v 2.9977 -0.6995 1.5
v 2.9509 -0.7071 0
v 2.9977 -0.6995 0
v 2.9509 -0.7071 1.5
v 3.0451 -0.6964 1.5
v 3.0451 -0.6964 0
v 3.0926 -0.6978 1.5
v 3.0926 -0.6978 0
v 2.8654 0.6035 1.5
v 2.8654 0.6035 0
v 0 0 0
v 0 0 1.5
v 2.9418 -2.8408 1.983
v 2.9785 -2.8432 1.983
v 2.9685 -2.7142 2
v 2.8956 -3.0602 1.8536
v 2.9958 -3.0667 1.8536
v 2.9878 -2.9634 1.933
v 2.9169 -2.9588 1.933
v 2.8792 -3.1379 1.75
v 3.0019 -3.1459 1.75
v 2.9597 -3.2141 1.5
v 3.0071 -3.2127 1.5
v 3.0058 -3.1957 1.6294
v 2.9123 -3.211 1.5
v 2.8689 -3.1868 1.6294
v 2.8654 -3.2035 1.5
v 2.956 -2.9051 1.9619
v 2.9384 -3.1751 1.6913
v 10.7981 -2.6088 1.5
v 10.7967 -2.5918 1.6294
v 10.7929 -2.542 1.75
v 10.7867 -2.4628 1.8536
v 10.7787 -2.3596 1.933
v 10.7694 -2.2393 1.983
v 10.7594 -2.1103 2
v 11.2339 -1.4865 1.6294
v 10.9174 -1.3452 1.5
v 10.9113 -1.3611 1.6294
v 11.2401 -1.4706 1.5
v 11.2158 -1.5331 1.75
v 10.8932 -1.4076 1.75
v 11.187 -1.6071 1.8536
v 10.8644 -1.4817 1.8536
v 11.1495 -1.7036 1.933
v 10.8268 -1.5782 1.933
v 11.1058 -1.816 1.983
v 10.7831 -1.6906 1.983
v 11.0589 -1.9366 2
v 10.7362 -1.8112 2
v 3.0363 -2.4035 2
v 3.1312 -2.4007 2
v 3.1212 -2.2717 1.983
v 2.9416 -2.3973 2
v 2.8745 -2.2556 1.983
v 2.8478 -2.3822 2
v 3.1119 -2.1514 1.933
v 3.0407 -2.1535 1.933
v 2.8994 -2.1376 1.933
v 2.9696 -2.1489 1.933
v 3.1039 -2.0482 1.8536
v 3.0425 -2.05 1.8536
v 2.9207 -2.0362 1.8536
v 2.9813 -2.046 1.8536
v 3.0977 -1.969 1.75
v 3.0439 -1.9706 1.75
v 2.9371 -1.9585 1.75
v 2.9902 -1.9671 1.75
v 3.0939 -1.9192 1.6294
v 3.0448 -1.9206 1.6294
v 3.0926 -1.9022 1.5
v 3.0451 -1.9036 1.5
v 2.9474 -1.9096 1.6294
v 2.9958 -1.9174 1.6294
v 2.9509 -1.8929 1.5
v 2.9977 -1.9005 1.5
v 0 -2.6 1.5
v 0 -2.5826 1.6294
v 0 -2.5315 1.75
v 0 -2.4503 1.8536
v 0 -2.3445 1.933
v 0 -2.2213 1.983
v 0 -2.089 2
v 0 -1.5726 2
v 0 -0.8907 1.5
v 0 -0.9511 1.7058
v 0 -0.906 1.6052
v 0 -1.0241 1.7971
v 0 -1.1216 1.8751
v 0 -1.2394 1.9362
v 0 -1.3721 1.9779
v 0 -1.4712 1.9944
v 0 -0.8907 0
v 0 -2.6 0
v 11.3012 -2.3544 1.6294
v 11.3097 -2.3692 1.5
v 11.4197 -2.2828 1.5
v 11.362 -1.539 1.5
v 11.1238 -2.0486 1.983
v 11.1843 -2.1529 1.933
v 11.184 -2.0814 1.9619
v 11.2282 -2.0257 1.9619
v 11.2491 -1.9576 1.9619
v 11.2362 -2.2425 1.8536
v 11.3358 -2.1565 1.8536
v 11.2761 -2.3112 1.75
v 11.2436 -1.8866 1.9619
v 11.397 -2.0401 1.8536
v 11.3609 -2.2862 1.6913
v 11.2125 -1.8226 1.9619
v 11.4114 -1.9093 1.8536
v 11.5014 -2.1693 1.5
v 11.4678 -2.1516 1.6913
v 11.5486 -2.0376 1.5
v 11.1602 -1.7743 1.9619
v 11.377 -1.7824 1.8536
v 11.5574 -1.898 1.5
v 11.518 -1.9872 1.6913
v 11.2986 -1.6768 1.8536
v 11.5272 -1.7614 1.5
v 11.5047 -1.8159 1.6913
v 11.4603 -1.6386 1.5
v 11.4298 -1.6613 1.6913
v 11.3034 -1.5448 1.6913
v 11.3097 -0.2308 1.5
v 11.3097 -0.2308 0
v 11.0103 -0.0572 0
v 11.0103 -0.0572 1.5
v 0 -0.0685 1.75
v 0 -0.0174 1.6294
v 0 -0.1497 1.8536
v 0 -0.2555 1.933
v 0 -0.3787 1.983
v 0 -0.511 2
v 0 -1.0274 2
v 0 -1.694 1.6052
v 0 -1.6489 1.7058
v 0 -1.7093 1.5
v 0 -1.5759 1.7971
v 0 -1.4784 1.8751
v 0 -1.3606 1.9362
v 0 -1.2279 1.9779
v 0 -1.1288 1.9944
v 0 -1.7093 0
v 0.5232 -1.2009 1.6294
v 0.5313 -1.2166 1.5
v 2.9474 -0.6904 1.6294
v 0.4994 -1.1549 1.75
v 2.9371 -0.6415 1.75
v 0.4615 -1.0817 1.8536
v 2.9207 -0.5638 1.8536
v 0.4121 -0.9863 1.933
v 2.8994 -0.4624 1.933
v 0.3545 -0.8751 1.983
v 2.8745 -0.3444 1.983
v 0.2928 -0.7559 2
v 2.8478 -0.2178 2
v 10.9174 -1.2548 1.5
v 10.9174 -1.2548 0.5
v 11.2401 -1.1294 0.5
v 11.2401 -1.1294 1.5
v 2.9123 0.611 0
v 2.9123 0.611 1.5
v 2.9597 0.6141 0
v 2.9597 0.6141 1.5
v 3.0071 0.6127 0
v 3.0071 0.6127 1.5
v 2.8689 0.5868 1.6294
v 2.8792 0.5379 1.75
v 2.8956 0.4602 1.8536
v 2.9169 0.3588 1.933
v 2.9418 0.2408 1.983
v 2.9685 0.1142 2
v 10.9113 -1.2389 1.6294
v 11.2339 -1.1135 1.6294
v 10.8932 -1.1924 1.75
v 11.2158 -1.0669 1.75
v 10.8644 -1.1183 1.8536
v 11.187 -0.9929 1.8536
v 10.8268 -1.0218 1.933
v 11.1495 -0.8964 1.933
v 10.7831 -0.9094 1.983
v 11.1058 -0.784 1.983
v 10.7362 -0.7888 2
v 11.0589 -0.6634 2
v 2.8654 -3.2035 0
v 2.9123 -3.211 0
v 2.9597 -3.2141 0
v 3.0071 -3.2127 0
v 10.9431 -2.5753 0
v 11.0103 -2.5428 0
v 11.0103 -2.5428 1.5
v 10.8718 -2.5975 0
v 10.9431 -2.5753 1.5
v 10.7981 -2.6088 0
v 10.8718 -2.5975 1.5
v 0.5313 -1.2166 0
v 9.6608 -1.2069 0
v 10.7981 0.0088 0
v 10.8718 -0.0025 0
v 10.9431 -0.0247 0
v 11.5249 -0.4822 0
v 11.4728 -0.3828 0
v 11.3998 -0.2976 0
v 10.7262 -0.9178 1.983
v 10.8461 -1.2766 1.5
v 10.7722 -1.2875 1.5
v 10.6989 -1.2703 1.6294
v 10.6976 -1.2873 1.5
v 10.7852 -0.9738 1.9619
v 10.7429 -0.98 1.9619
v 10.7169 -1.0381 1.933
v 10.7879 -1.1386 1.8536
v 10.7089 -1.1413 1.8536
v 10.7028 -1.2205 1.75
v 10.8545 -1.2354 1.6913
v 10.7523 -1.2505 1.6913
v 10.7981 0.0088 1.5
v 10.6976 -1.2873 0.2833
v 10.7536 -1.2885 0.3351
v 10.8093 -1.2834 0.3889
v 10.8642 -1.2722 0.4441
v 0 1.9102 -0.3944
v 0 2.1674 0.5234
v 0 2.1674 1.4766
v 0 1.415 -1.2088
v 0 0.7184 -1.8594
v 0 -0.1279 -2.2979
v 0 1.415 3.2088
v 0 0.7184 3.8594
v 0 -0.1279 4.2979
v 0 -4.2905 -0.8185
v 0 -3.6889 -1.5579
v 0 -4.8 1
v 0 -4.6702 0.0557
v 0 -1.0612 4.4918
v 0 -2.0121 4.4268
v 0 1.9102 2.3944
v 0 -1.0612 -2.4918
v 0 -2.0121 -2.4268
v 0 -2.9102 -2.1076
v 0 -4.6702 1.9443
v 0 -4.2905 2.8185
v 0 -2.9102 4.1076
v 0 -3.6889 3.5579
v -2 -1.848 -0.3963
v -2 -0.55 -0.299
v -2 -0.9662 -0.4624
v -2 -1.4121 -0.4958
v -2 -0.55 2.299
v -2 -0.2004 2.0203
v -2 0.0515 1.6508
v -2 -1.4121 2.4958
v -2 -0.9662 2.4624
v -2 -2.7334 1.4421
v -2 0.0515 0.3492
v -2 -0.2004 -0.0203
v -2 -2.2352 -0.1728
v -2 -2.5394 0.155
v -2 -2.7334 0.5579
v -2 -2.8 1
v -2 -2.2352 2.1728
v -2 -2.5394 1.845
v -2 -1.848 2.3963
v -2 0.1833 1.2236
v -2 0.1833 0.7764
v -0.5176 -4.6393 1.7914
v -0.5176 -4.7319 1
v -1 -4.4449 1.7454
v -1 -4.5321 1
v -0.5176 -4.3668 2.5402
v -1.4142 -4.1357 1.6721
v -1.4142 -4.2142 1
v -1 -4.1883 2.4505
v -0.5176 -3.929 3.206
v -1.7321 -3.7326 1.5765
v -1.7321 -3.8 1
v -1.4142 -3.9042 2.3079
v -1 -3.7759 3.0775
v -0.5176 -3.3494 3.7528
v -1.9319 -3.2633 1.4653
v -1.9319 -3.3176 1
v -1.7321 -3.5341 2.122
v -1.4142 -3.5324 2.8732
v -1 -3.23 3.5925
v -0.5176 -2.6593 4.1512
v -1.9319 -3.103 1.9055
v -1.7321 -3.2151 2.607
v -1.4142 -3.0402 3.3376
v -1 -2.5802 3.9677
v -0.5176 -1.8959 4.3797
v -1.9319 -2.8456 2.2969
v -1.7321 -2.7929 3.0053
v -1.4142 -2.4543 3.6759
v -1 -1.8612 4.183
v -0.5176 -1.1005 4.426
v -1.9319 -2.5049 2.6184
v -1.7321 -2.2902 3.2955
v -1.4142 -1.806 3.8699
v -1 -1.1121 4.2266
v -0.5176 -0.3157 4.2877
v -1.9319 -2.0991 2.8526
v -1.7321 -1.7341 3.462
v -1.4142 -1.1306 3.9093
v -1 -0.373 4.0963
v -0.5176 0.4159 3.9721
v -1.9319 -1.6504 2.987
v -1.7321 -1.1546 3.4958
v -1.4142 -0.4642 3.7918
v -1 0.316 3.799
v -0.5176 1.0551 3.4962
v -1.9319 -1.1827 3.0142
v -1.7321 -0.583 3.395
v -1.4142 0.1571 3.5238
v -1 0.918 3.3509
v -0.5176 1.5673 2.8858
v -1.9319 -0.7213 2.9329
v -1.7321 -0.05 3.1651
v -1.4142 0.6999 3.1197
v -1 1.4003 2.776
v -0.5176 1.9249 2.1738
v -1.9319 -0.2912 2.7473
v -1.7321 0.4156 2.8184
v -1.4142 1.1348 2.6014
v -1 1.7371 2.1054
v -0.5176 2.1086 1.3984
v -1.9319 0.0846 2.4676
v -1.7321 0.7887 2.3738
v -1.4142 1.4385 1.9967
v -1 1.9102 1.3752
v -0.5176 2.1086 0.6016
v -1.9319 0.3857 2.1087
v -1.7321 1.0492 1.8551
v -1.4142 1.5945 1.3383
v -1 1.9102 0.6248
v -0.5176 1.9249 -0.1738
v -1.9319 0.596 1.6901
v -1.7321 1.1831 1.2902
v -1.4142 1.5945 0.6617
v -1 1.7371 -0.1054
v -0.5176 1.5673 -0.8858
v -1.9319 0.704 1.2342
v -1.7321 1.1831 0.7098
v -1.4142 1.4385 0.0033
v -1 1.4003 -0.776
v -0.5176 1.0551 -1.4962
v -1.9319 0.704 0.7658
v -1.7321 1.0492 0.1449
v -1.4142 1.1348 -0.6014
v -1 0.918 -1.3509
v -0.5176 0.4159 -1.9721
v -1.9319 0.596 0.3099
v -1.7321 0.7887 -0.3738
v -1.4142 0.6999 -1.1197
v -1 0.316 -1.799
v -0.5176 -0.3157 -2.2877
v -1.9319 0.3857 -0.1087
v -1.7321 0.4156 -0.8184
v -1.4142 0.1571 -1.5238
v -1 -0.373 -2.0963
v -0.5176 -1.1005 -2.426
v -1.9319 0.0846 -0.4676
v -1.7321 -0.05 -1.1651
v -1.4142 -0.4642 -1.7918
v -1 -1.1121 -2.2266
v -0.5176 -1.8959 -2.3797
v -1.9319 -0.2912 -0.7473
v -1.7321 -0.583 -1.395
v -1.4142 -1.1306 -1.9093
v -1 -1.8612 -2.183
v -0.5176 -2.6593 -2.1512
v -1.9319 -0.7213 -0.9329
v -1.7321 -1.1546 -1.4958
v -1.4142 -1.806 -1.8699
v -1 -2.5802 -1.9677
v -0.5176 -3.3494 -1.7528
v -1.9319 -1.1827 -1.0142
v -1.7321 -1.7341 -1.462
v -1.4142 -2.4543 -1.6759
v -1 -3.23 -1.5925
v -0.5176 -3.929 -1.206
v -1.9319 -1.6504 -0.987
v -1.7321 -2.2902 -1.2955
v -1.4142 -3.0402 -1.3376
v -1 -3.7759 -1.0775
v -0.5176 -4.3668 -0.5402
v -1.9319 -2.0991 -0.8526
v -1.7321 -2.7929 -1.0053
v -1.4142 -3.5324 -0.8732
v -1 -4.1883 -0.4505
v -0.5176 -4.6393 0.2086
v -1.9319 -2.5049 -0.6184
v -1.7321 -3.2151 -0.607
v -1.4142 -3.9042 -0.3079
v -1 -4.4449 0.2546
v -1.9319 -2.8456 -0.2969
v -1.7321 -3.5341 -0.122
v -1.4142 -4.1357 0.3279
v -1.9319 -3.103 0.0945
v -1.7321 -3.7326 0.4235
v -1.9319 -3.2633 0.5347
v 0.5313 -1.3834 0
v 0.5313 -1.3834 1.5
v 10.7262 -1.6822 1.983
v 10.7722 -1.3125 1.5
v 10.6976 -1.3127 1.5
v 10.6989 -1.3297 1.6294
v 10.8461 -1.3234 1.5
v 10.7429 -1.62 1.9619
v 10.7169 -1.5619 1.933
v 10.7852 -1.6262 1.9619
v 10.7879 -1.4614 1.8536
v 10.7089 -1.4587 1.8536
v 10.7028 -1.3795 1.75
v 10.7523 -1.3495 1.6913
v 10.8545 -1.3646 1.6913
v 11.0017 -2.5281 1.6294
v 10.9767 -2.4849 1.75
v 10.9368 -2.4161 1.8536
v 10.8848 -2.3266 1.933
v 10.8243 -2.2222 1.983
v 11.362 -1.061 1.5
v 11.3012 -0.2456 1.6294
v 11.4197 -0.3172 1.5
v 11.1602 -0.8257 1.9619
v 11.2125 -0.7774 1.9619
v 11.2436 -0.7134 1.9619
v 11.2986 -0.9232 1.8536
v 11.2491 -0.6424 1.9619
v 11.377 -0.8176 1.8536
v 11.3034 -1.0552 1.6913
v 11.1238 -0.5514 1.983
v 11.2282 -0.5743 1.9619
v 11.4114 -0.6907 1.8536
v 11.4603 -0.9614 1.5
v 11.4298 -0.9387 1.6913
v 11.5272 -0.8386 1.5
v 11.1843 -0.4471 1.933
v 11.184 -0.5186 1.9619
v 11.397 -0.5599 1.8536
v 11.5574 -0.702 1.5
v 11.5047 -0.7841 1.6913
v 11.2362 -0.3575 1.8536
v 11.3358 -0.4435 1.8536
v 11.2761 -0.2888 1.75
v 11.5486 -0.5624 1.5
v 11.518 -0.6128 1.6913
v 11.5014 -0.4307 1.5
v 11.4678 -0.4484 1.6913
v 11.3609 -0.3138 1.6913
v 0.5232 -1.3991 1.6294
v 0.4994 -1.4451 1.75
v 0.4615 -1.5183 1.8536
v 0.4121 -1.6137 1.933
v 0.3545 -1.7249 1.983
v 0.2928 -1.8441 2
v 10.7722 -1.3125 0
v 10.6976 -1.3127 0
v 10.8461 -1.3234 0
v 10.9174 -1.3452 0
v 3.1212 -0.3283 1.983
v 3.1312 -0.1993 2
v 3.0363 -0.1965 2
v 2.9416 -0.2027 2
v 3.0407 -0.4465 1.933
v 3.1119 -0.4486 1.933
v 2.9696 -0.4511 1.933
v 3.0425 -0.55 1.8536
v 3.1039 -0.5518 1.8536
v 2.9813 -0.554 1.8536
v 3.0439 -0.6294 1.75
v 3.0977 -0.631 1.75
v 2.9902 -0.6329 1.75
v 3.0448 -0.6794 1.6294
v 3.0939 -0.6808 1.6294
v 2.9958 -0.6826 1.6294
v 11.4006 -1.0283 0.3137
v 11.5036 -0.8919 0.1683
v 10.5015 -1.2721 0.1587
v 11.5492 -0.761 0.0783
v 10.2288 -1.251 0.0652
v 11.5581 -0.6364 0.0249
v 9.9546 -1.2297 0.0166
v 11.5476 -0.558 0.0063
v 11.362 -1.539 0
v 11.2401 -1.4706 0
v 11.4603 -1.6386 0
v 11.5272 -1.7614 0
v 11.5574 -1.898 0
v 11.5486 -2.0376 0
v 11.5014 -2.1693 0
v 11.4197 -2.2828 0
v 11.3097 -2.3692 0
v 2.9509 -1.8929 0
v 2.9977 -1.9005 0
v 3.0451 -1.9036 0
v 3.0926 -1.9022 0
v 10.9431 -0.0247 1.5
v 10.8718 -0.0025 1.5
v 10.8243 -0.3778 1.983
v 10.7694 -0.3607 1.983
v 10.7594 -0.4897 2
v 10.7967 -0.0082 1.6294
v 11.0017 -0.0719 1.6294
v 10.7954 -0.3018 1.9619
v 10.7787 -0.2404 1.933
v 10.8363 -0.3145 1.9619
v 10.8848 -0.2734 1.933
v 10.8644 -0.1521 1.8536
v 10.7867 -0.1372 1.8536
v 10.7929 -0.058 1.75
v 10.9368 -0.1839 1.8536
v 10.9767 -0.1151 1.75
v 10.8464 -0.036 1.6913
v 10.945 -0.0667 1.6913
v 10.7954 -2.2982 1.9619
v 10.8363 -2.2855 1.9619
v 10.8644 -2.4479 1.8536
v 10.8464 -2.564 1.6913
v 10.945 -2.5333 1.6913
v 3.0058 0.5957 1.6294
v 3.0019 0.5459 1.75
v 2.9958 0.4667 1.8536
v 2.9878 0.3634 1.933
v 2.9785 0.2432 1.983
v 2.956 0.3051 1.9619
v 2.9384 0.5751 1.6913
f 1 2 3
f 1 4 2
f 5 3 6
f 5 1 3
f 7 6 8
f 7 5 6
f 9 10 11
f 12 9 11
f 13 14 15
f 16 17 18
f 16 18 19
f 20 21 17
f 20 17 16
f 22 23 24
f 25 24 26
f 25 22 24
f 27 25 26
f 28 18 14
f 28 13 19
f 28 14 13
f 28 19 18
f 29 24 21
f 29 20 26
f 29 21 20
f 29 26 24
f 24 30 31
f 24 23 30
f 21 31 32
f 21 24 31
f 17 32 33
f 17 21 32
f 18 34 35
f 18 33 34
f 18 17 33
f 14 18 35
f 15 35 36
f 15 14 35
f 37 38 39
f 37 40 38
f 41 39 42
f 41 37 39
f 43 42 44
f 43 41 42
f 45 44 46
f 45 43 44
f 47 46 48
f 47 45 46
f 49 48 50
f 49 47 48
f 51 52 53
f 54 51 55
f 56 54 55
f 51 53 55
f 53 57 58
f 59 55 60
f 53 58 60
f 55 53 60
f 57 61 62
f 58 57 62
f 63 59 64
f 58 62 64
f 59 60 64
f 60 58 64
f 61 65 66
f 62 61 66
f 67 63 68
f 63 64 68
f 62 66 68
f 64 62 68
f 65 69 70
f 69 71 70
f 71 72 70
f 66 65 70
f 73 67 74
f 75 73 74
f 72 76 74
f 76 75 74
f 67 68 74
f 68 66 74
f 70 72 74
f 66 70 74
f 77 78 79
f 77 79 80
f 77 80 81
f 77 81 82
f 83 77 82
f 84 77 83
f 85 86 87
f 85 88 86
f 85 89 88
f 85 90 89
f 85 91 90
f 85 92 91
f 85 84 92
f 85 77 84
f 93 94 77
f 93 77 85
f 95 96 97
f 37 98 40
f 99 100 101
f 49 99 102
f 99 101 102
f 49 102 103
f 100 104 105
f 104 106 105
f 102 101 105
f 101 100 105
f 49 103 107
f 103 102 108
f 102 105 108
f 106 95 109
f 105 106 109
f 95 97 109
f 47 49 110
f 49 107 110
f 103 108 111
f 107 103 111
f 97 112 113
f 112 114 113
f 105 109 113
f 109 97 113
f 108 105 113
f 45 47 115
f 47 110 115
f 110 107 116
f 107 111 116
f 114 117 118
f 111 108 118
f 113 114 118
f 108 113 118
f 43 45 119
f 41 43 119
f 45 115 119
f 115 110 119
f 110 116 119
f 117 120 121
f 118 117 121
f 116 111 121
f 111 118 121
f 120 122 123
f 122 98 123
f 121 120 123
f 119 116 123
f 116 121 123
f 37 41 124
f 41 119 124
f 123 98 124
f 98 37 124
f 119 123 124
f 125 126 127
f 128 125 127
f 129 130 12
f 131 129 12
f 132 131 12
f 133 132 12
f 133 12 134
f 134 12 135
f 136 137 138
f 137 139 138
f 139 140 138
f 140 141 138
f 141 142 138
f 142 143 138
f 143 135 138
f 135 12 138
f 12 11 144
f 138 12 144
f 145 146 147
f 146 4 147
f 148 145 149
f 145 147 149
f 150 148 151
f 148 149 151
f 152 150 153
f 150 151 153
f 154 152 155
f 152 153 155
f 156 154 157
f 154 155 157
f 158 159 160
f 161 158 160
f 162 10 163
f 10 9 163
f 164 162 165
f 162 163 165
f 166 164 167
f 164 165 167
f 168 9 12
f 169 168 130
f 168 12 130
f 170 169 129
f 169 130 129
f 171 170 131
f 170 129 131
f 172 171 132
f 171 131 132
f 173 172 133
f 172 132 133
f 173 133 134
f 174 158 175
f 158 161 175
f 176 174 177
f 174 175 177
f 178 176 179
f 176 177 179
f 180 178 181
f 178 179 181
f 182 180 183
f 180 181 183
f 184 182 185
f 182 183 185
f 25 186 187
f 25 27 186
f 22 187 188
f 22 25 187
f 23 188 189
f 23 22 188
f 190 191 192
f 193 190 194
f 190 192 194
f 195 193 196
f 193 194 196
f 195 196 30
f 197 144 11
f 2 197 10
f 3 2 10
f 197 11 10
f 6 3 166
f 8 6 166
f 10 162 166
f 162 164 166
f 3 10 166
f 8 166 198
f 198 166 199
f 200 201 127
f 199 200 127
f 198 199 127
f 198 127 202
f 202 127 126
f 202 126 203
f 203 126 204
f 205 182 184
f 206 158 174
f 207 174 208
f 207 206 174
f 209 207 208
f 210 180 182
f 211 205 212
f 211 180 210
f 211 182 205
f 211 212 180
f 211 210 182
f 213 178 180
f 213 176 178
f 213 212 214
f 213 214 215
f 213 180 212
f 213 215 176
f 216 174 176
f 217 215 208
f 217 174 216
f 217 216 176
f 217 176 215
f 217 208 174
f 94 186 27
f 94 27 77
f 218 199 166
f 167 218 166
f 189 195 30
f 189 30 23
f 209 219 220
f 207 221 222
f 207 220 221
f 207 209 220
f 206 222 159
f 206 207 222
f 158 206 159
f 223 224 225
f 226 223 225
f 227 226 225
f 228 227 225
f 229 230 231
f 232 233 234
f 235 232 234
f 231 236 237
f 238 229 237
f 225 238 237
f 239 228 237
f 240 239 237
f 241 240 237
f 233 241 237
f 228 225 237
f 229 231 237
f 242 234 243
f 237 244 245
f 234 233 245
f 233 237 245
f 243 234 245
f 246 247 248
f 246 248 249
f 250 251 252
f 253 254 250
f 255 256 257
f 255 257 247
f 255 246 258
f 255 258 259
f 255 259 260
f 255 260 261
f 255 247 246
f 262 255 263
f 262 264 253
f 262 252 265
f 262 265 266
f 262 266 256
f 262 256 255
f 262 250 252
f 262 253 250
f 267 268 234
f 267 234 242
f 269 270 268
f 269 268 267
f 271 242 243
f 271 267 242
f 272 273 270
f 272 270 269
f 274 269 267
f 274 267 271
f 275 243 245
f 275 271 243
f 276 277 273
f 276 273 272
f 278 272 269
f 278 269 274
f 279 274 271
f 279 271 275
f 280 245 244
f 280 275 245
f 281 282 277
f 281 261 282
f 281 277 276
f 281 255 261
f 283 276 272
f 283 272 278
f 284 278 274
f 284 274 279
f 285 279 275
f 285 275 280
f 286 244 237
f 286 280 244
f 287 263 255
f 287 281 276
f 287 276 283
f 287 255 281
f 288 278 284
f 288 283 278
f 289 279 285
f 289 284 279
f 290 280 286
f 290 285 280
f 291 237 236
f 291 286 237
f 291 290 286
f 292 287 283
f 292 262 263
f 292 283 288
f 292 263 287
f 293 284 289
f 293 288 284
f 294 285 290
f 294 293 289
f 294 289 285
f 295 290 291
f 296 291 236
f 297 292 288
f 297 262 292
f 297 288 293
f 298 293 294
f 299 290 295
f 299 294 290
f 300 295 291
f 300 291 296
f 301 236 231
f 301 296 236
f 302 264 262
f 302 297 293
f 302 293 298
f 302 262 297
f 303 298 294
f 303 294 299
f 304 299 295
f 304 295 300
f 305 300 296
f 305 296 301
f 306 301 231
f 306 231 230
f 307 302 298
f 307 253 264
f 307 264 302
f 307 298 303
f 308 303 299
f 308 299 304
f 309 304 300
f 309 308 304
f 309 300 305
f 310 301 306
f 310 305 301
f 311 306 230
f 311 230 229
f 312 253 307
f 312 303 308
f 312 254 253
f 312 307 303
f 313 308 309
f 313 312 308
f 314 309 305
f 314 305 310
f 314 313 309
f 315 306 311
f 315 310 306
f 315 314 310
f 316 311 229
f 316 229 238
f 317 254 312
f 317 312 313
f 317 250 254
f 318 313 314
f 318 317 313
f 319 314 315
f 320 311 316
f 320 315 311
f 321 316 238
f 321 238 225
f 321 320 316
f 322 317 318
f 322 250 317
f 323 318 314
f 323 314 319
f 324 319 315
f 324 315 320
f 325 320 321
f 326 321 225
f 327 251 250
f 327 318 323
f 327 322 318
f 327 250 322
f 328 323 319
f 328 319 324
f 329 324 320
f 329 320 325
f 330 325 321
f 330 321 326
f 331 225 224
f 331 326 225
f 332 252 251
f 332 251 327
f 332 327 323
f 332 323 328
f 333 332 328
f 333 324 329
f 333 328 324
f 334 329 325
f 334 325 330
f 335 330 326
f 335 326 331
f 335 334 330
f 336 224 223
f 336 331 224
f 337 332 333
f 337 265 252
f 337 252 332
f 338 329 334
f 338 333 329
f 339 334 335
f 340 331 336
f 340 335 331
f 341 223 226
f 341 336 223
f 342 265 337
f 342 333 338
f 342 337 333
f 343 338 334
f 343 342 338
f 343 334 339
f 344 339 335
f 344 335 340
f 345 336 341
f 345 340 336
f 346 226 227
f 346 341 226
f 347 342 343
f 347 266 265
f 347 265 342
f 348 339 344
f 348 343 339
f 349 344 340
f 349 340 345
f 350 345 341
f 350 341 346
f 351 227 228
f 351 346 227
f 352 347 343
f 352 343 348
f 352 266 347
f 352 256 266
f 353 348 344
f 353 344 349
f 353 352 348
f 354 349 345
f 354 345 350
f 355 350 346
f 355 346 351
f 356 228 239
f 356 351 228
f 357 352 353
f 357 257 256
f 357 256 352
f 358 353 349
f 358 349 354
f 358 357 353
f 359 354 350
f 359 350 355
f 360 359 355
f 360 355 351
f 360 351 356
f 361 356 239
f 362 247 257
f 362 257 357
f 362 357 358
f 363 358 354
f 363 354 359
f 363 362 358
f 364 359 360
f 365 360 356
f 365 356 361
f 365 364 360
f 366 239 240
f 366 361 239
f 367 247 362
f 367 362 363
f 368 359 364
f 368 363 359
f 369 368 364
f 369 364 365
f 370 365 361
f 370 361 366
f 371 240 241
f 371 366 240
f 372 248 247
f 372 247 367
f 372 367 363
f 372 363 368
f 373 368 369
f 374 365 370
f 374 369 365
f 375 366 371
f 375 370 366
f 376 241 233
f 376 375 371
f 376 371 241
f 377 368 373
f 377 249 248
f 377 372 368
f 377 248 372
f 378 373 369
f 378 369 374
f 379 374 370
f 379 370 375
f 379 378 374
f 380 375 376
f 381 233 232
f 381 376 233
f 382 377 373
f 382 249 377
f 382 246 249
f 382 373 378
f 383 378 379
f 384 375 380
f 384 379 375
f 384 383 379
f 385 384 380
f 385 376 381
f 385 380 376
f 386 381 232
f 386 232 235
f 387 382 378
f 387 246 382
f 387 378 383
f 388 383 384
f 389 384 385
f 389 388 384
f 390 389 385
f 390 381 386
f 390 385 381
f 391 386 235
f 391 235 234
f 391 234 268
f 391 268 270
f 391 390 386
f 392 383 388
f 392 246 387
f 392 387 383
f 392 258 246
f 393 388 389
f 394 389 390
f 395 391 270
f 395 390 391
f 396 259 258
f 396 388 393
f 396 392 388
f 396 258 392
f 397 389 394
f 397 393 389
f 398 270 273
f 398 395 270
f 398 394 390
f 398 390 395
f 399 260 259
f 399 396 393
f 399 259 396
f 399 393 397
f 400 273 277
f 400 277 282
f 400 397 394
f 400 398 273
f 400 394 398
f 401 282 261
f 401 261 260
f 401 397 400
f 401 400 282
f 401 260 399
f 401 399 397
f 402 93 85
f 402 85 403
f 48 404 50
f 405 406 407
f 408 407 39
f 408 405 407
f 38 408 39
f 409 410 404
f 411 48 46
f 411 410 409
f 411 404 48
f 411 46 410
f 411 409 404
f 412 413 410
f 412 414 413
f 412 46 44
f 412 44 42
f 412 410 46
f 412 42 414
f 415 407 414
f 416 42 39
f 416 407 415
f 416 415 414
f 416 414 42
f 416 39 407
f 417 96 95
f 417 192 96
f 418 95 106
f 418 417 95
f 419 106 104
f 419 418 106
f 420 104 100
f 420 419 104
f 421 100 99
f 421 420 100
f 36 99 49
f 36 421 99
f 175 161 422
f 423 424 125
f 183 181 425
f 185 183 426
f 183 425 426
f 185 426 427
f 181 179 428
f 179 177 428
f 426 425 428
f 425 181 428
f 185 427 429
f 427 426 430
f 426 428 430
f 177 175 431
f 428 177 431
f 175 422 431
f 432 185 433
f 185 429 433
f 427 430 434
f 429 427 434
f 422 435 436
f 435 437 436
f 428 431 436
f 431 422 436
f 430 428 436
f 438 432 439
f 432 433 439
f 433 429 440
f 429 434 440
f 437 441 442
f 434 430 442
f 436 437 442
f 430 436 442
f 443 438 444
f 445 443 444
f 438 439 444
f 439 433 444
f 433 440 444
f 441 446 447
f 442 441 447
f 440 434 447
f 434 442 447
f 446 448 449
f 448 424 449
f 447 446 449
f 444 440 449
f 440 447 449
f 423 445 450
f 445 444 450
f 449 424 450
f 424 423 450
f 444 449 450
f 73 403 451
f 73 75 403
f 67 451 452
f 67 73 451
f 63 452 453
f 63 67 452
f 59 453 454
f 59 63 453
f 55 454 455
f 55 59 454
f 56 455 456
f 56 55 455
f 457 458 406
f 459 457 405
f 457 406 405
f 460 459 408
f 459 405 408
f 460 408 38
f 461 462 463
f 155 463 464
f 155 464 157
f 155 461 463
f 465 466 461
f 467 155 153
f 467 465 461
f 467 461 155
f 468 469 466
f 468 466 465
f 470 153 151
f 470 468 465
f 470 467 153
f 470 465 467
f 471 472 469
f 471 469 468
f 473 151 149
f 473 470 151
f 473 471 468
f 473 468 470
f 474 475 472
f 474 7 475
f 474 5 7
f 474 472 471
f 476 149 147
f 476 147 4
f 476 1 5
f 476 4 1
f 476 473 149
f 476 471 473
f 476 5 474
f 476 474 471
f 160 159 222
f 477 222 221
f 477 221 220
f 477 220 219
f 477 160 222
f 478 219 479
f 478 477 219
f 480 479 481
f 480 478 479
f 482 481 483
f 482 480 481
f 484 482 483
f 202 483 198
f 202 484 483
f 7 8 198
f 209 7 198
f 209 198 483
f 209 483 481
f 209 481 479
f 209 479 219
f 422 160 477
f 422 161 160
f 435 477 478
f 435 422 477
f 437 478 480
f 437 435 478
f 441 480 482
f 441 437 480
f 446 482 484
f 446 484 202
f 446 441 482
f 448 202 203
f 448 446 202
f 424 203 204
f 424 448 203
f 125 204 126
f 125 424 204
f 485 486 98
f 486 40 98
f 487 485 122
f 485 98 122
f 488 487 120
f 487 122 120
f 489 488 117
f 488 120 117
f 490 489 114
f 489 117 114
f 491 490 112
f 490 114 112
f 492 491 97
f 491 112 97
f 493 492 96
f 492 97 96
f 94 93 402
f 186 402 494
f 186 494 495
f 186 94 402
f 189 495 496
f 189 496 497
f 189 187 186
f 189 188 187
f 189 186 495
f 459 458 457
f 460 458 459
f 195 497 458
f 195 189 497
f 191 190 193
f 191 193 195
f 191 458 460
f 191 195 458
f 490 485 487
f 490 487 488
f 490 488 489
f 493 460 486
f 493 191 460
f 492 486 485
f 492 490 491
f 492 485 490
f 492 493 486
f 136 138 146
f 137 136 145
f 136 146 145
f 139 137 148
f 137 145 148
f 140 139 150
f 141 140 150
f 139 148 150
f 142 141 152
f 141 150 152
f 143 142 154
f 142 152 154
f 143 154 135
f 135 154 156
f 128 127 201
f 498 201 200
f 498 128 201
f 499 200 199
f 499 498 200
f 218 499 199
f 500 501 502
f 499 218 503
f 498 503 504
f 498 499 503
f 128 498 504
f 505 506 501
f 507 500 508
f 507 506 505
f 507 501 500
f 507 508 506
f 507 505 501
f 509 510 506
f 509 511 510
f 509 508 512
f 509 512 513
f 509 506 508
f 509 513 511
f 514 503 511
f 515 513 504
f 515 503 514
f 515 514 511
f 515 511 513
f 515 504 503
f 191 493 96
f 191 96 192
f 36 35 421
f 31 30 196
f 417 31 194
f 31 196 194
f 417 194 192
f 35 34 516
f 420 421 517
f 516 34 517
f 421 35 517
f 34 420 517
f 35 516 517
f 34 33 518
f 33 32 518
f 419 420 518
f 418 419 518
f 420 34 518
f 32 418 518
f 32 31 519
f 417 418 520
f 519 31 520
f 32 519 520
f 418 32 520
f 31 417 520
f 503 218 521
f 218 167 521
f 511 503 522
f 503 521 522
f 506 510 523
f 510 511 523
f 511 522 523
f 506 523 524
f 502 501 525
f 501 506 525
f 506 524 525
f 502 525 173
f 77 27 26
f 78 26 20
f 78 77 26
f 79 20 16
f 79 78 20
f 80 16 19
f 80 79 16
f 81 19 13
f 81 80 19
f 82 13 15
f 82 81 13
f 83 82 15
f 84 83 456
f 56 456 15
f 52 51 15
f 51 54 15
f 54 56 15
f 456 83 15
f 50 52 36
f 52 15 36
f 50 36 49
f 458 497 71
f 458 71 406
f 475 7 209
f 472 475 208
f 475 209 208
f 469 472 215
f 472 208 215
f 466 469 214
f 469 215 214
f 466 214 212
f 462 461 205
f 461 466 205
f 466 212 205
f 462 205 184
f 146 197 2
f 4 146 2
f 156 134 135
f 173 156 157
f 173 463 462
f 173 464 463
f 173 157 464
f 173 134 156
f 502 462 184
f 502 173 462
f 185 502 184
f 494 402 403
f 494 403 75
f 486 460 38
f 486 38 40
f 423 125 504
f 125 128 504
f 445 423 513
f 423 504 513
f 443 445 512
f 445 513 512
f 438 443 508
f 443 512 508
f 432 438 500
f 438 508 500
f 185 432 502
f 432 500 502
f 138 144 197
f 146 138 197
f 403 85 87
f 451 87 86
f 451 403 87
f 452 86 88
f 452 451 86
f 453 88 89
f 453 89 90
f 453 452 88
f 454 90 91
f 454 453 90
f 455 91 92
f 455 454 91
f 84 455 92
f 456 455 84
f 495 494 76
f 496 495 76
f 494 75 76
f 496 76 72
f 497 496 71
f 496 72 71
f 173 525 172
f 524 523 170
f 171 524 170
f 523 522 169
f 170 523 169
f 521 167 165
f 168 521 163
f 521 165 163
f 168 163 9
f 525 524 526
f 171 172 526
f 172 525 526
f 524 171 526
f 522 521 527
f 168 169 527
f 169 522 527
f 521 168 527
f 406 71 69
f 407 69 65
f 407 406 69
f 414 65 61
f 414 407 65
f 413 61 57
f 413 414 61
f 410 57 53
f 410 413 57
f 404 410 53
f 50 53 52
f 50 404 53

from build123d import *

# Parameters (mm, degrees)
F1_DEPTH = 2
F4_R     = 0.5
F4_2_R   = 0.5
F5_R     = 3.5
F6_DEPTH = 2
F7_R     = 1.99999


# Not quite as in the source:
# - a fillet or chamfer is up to 0.001 mm smaller than in the source, because OpenCascade refuses the exact size


with BuildPart() as f1:
    # F0 (on Top) → F1 (new body)
    with BuildSketch(Plane.XY):
        Polygon((2.93560655, 0.6182347319), (0, 0), (0, -1.7093243077), (0.5313075392, -1.2166232651), (3.0210481864, -0.6922872837), (10.8112192467, -1.2961123241), (12.209258666, -0.7525262849), (10.9116823906, 0), align=None)
    extrude(amount=F1_DEPTH)


with BuildPart() as f3_1:
    # F3: instance of F1
    add(f1.part.mirror(Plane.XZ.offset(1.3)))

    # F4#2
    f4_2_edges = [f3_1.edges().sort_by_distance(p)[0] for p in [
        (3.021048, -1.907713, 1),
        (10.811219, -1.303888, 1),
        (12.209259, -1.847474, 1),
        (10.911682, -2.6, 1),
        (6.923644, -2.909117, 2),
        (11.560471, -2.223737, 2),
        (6.916134, -1.6058, 2),
        (11.510239, -1.575681, 2),
        (1.467803, -2.909117, 2),
        (2.935607, -3.218235, 1),
        (1.776178, -1.645545, 2),
        (0.265654, -1.137026, 2),
    ]]
    fillet(f4_2_edges, radius=F4_2_R)


with BuildPart() as f1_1:
    add(f1.part)

    # F4
    f4_edges = [f1_1.edges().sort_by_distance(p)[0] for p in [
        (6.916134, -0.9942, 2),
        (6.923644, 0.309117, 2),
        (11.560471, -0.376263, 2),
        (10.811219, -1.296112, 1),
        (12.209259, -0.752526, 1),
        (11.510239, -1.024319, 0),
        (11.510239, -1.024319, 2),
        (1.467803, 0.309117, 2),
        (1.776178, -0.954455, 2),
        (3.021048, -0.692287, 1),
        (0.265654, -1.462974, 2),
        (10.911682, 0, 1),
        (2.935607, 0.618235, 1),
    ]]
    fillet(f4_edges, radius=F4_R)


with BuildPart() as f6:
    # F5 (on face) → F6 (new body)
    with BuildSketch(Plane(origin=(0, 0, 0), x_dir=(0, -1, 0), z_dir=(-1, 0, 0))):
        with Locations((1.3, 1)):
            Circle(F5_R)
        with BuildLine():
            Line((0, 0), (0, 1.5))
            add(Edge.make_bspline(
                [(0, 1.5), (0, 2), (0.5109676568, 2)],
                knots=[3.1415926536, 3.1415926536, 3.1415926536, 4.7123889804, 4.7123889804, 4.7123889804], degree=2, weights=[1, 0.7071067812, 1]))
            Line((0.5109676568, 2), (1.0274237333, 2))
            add(Edge.make_bspline(
                [(1.7093243077, 1.5), (1.7093243077, 2), (1.0274237333, 2)],
                knots=[3.1415926536, 3.1415926536, 3.1415926536, 4.7123889804, 4.7123889804, 4.7123889804], degree=2, weights=[1, 0.7071067812, 1]))
            Line((1.7093243077, 1.5), (1.7093243077, 0))
            Line((1.7093243077, 0), (0, 0))
        make_face(mode=Mode.SUBTRACT)
        with BuildLine():
            add(Edge.make_bspline(
                [(0, 1.5), (0, 2), (0.5109676568, 2)],
                knots=[3.1415926536, 3.1415926536, 3.1415926536, 4.7123889804, 4.7123889804, 4.7123889804], degree=2, weights=[1, 0.7071067812, 1]))
            Line((0, 1.5), (0, 0))
            Line((0, 0), (1.7093243077, 0))
            Line((1.7093243077, 0), (1.7093243077, 1.5))
            add(Edge.make_bspline(
                [(1.7093243077, 1.5), (1.7093243077, 2), (1.0274237333, 2)],
                knots=[3.1415926536, 3.1415926536, 3.1415926536, 4.7123889804, 4.7123889804, 4.7123889804], degree=2, weights=[1, 0.7071067812, 1]))
            Line((1.0274237333, 2), (0.5109676568, 2))
        make_face()
    extrude(amount=F6_DEPTH)

    # F7 (radius 2 in the source; OpenCascade refuses exactly that, so slightly less here)
    f7_edges = [f6.edges().sort_by_distance(p)[0] for p in [
        (-2, 2.2, 1),
    ]]
    fillet(f7_edges, radius=F7_R)


solid = Compound([f3_1.part, f1_1.part, f6.part])
